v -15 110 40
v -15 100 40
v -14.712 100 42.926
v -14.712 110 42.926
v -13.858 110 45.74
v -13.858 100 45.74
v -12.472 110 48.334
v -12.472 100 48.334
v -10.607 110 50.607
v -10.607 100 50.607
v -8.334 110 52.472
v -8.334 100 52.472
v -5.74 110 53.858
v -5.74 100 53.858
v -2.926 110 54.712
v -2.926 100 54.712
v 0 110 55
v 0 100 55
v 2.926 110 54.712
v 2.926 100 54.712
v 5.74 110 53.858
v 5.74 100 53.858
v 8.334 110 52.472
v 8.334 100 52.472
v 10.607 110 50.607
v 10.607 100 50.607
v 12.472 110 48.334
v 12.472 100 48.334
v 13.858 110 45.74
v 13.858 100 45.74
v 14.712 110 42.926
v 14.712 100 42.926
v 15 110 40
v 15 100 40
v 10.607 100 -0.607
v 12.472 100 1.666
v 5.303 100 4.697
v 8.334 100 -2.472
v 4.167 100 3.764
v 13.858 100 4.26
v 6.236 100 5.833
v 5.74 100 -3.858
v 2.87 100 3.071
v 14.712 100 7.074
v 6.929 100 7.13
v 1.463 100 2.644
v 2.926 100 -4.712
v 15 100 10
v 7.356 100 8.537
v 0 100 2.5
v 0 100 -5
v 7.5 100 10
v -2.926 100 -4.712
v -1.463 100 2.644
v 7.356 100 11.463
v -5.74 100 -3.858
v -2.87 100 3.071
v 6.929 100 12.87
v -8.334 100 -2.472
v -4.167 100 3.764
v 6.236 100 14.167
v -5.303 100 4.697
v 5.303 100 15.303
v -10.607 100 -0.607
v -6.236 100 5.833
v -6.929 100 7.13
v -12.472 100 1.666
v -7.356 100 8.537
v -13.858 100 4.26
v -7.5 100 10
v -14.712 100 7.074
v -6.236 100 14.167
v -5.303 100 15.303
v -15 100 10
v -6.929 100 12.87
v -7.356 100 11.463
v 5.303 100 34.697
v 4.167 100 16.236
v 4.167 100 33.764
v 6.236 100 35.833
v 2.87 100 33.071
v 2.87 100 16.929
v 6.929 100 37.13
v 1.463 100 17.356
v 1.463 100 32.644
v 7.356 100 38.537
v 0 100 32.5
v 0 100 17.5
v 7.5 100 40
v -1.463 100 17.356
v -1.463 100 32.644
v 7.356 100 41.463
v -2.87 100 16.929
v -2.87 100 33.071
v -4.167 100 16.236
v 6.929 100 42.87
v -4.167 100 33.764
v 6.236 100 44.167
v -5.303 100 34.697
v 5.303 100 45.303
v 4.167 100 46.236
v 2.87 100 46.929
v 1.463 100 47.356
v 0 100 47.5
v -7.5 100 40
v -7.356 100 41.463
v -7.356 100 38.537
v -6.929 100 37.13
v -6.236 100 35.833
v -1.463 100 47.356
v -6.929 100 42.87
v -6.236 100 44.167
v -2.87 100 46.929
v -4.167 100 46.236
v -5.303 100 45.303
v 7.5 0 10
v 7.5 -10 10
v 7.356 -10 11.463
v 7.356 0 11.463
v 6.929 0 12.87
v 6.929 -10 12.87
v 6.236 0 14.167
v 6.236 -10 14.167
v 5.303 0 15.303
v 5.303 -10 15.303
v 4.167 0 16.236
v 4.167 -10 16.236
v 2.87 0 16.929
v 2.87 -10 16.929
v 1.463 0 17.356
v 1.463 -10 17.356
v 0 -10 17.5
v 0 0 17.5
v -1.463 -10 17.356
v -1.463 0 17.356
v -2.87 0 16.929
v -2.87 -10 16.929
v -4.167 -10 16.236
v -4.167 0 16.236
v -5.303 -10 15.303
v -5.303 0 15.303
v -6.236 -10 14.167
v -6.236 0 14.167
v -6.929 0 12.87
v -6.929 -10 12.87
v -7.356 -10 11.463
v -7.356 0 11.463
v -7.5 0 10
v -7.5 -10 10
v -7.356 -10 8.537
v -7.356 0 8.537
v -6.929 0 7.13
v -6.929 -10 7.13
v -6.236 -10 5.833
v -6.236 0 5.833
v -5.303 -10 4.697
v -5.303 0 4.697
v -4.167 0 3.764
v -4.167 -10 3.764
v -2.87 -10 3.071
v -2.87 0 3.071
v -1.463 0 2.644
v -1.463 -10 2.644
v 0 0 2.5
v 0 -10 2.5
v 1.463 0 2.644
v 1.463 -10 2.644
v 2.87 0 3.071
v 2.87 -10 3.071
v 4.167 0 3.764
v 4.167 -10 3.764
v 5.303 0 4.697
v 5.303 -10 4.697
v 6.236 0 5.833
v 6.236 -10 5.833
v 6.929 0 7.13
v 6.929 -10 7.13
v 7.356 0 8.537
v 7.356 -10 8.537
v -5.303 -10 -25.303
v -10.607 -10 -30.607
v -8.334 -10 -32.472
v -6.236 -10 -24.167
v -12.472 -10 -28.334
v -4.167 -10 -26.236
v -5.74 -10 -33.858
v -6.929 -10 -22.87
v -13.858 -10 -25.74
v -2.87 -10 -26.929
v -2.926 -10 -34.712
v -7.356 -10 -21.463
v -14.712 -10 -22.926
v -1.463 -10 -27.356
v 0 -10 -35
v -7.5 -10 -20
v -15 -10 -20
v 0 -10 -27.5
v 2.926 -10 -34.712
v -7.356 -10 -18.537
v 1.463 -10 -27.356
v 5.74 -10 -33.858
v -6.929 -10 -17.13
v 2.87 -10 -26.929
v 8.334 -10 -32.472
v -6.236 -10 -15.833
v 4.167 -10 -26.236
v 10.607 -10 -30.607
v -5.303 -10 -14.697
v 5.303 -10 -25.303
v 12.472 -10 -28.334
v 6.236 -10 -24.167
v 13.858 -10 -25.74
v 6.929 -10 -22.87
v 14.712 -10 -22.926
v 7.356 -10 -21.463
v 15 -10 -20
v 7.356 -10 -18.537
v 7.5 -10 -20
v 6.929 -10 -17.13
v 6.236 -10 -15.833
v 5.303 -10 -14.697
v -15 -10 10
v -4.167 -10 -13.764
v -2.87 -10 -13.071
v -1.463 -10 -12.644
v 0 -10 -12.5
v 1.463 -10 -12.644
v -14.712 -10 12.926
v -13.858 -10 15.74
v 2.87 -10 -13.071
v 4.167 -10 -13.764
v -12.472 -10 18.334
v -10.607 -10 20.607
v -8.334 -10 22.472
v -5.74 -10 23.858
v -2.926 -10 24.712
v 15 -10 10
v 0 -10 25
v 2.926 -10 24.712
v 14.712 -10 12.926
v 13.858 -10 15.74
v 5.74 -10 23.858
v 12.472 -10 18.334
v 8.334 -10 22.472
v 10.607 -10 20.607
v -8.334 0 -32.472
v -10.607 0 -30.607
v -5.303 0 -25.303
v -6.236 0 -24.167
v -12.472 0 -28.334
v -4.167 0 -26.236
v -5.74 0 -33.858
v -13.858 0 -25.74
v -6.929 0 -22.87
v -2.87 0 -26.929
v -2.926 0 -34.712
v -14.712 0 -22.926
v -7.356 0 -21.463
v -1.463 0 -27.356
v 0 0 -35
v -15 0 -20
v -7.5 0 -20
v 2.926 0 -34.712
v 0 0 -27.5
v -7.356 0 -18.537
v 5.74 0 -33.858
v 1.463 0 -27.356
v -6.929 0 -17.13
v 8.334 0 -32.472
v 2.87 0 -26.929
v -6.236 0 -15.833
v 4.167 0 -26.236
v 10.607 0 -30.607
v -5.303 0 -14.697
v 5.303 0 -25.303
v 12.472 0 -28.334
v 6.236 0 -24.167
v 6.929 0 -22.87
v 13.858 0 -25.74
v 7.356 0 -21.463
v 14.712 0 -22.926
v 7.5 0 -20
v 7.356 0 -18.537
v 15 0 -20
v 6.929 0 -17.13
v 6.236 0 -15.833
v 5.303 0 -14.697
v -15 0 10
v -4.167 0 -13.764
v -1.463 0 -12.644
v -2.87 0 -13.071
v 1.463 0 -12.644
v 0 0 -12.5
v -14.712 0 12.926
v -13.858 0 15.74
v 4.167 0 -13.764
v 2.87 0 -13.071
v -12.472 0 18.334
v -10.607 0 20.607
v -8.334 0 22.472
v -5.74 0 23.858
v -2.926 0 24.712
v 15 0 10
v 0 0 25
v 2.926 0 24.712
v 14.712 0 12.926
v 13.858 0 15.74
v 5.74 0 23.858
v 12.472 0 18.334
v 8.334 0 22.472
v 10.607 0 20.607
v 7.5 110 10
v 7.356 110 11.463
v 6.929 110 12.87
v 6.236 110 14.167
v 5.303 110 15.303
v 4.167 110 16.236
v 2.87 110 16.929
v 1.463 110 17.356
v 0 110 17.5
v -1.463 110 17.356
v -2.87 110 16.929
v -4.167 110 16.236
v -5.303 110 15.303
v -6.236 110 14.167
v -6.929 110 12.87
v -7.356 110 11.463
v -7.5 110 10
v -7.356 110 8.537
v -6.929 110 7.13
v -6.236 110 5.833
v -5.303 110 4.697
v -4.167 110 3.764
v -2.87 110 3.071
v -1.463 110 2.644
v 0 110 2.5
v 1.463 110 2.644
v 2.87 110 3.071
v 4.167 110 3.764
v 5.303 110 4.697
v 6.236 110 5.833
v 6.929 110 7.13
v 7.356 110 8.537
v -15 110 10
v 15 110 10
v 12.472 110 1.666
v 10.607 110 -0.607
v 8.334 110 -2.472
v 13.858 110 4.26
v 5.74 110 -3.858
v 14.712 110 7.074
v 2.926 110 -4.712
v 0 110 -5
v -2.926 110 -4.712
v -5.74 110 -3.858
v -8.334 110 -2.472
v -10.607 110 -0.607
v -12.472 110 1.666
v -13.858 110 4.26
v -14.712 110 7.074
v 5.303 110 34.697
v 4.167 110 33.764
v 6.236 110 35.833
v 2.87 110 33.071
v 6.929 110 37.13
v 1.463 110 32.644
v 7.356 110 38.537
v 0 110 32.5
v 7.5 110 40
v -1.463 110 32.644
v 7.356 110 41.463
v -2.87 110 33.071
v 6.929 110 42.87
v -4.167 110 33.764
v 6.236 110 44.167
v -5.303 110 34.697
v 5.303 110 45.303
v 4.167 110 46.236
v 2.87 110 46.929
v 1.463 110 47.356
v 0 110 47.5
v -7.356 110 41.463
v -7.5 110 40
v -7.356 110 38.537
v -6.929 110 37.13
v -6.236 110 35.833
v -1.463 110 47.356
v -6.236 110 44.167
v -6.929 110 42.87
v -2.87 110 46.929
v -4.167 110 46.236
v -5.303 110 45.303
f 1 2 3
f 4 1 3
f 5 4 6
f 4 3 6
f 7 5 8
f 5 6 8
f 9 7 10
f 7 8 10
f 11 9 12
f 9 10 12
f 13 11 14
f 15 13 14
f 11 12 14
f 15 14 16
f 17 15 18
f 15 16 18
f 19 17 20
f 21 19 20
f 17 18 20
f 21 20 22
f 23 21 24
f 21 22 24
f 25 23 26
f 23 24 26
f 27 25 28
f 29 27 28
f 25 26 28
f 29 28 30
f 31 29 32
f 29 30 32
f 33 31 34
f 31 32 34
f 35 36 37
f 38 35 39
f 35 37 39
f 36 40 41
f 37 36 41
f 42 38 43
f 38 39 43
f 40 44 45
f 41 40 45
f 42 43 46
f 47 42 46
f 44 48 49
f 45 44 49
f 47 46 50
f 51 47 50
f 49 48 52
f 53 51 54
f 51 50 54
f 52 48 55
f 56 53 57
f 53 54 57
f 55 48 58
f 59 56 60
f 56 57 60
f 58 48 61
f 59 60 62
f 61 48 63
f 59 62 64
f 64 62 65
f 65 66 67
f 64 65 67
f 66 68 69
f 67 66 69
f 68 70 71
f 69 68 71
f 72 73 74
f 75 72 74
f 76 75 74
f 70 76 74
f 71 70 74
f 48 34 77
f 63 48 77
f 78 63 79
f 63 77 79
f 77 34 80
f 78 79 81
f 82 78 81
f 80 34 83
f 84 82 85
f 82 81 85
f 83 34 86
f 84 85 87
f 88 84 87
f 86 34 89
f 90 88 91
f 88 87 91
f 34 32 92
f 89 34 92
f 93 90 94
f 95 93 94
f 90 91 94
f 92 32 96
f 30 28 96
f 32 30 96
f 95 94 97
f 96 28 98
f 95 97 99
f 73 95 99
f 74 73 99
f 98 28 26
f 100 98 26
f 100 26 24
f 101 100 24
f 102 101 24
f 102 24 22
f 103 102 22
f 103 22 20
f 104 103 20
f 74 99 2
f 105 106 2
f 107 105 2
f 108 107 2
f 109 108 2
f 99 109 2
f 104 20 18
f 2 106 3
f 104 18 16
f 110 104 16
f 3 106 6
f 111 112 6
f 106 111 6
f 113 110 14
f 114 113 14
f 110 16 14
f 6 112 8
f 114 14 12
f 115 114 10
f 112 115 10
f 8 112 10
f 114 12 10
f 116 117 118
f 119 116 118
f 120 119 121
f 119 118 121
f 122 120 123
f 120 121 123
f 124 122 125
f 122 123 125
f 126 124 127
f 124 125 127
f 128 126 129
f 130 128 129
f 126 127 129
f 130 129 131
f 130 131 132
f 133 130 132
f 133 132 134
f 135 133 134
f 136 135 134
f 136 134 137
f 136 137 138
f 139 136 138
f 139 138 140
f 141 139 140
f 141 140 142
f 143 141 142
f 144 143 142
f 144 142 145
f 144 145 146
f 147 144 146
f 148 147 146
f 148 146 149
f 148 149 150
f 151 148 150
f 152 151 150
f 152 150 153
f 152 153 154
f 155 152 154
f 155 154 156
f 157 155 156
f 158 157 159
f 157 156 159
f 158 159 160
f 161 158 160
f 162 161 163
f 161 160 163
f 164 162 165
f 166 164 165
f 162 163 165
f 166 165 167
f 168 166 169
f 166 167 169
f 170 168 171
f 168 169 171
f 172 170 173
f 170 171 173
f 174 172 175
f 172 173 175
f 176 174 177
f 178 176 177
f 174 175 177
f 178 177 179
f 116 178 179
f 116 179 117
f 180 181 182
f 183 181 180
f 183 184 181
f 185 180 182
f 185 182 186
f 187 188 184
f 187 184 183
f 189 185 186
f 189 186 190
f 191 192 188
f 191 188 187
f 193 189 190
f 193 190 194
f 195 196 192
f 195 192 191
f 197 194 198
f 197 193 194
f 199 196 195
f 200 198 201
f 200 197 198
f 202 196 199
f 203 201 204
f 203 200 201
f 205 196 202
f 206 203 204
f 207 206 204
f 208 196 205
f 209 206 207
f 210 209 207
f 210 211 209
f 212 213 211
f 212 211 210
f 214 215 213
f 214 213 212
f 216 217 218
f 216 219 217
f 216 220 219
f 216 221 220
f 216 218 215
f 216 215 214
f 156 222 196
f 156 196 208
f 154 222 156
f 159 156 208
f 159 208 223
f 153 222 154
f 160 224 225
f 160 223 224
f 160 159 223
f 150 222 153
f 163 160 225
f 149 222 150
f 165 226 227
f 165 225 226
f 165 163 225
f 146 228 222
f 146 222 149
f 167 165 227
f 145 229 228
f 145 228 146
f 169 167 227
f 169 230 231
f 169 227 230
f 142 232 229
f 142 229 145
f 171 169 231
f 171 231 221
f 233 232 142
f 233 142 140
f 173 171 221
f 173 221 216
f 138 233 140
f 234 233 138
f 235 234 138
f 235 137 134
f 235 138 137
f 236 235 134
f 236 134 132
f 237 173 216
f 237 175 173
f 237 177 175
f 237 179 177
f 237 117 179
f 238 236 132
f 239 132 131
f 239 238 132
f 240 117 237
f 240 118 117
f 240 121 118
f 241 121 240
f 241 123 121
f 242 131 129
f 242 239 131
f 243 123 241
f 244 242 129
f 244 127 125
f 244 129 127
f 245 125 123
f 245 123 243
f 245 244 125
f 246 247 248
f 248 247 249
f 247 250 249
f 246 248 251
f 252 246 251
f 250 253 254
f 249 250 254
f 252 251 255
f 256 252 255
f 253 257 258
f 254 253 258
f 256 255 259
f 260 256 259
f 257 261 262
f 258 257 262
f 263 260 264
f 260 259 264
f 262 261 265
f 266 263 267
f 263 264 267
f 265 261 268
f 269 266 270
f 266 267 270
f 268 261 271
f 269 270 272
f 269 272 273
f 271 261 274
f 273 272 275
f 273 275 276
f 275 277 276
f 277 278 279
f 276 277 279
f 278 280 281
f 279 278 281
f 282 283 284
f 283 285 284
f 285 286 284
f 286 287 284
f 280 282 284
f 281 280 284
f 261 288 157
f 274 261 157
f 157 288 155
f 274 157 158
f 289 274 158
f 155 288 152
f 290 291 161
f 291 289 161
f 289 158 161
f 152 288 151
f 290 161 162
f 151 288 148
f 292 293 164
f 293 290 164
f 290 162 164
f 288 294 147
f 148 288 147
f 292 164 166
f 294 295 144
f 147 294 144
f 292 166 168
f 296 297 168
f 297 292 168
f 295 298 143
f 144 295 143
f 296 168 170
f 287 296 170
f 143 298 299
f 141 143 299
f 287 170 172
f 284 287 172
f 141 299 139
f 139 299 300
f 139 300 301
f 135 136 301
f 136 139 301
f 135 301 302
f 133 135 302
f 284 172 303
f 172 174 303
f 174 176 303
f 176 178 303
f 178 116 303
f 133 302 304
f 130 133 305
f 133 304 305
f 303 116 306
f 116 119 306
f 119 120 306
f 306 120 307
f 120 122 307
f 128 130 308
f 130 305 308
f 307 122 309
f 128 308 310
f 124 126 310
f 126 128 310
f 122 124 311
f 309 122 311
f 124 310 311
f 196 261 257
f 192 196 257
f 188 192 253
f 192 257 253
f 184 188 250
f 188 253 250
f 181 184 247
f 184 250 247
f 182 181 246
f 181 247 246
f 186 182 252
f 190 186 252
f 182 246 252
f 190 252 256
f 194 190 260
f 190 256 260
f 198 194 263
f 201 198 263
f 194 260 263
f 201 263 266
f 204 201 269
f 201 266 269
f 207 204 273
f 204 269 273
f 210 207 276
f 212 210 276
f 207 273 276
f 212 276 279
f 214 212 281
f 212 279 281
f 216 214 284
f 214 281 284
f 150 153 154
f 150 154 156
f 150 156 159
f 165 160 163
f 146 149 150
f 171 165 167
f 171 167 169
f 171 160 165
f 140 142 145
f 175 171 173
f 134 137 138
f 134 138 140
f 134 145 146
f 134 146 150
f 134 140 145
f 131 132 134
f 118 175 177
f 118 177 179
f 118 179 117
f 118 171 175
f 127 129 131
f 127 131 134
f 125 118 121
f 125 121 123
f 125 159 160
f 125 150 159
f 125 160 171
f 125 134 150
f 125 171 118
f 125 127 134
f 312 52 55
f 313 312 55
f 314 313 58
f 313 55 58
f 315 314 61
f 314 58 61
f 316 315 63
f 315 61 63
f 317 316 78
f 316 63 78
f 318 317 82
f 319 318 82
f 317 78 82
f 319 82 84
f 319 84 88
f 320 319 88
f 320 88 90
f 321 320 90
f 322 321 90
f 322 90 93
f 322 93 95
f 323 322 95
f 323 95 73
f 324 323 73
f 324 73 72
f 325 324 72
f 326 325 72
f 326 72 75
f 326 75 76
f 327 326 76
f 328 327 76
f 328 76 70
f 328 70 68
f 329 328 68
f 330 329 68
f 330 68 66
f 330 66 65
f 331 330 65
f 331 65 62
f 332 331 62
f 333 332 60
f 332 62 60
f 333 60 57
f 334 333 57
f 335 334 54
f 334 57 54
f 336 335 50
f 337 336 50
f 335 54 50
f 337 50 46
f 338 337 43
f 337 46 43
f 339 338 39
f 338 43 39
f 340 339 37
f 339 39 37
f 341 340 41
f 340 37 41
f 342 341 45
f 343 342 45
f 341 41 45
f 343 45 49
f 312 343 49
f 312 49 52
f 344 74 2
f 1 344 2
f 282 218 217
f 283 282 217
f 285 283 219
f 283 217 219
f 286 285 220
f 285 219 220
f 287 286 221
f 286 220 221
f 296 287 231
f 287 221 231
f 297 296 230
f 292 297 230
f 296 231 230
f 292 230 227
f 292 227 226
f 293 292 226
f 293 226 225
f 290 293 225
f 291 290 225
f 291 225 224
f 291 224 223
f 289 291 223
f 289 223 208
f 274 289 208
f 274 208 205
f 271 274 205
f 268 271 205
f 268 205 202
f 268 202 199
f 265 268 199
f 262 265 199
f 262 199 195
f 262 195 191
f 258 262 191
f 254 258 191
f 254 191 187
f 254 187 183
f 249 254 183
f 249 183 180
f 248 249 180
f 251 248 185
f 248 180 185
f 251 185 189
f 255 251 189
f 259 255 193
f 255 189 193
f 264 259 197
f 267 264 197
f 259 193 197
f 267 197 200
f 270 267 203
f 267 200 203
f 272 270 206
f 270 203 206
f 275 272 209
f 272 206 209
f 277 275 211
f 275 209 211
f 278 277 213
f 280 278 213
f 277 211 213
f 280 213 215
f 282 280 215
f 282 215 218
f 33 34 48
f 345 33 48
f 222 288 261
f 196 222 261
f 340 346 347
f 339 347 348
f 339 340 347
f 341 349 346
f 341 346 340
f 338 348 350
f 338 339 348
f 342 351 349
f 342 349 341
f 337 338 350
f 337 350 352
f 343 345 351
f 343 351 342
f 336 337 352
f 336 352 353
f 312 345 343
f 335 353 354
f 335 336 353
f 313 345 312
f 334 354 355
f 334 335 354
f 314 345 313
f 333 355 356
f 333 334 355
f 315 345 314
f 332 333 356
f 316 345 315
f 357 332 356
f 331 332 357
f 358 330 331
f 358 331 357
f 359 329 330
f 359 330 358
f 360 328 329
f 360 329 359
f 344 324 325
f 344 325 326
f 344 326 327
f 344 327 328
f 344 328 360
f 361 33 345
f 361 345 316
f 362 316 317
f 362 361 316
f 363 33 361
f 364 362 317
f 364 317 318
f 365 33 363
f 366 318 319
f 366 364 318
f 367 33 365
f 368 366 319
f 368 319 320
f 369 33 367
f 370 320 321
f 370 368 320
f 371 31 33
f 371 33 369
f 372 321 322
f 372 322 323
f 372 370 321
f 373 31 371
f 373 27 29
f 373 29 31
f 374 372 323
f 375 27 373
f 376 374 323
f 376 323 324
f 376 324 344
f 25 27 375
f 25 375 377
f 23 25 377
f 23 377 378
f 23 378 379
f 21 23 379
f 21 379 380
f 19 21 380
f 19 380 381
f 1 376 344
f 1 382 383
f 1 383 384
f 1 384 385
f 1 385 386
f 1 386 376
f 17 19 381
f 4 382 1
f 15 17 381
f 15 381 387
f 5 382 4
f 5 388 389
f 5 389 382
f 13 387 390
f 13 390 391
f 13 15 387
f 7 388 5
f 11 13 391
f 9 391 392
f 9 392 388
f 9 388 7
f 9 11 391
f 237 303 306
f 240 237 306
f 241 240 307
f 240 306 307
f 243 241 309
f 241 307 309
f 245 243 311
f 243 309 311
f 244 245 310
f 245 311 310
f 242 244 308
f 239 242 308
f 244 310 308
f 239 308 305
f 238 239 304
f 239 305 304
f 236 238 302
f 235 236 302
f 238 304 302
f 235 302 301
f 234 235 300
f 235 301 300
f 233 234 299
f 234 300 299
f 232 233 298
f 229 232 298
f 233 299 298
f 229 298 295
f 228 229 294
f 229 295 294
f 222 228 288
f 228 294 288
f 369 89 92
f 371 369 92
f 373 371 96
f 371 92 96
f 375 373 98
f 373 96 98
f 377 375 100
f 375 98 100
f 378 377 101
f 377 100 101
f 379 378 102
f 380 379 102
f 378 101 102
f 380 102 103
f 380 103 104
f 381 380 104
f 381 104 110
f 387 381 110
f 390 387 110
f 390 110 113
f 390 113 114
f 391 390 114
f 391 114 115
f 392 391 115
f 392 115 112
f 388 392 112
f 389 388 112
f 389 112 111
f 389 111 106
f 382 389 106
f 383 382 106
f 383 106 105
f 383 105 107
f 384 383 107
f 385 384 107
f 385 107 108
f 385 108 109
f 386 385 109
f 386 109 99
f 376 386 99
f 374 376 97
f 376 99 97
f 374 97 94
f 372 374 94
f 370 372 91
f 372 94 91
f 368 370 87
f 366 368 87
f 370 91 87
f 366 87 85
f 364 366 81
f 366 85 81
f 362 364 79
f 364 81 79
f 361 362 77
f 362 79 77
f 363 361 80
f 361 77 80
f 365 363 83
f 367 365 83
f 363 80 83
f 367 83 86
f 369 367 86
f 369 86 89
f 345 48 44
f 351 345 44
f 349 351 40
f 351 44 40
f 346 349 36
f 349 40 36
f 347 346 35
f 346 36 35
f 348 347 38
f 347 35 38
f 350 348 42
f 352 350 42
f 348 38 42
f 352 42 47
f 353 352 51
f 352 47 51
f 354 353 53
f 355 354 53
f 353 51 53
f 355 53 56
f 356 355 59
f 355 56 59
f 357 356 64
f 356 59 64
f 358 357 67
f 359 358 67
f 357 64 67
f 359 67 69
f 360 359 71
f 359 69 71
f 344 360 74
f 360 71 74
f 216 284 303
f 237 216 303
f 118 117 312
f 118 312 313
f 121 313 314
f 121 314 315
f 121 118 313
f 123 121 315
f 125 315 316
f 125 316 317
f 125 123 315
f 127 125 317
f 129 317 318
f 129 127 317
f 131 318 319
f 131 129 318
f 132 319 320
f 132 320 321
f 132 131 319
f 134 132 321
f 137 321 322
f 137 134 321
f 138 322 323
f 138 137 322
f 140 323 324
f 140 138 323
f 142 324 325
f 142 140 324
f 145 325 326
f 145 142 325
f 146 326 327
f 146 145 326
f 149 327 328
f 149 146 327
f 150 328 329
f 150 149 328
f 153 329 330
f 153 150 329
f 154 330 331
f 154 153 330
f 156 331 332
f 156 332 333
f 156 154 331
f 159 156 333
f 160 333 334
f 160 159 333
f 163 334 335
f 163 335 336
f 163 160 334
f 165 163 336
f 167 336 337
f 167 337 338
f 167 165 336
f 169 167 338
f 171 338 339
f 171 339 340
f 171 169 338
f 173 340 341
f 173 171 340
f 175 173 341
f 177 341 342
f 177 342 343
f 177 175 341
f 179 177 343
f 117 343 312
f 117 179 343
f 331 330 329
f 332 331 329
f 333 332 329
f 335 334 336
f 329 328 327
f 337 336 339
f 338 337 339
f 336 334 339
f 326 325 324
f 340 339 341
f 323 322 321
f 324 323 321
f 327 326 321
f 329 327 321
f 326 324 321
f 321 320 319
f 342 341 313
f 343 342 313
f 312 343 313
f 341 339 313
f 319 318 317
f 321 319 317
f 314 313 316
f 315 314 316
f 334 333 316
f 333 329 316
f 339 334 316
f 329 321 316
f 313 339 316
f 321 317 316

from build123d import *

# Parameters (mm, degrees)
F1_DEPTH  = 10
F2_R      = 7.5
F3_DEPTH  = 25
F6_DEPTH  = 10
F7_R      = 7.5
F8_DEPTH  = 25
F9_R      = 7.5
F10_DEPTH = 120


with BuildPart() as f1:
    # F0 (on Front) → F1 (new body)
    with BuildSketch(Plane.XZ):
        with BuildLine():
            Line((15, -20), (15, 10))
            ThreePointArc((15, 10), (0, 25), (-15, 10))
            Line((-15, 10), (-15, -20))
            ThreePointArc((-15, -20), (0, -35), (15, -20))
        make_face()
    extrude(amount=F1_DEPTH)

    # F2 (on face) → F3 (cut)
    with BuildSketch(Plane.XZ.offset(10)):
        with Locations((0, 10)):
            Circle(F2_R)
        with Locations((0, -20)):
            Circle(F2_R)
    extrude(amount=-F3_DEPTH, mode=Mode.SUBTRACT)


with BuildPart() as f6:
    # F5 (on offset) → F6 (new body)
    with BuildSketch(Plane(origin=(0, 100, 0), x_dir=(-1, 0, 0), z_dir=(0, 1, 0))):
        with BuildLine():
            Line((-15, 40), (-15, 10))
            ThreePointArc((-15, 10), (0, -5), (15, 10))
            Line((15, 10), (15, 40))
            ThreePointArc((15, 40), (0, 55), (-15, 40))
        make_face()
    extrude(amount=F6_DEPTH)

    # F7 (on face) → F8 (cut)
    with BuildSketch(Plane.XZ.offset(-100)):
        with Locations((0, 10)):
            Circle(F7_R)
        with Locations((0, 40)):
            Circle(F7_R)
    extrude(amount=-F8_DEPTH, mode=Mode.SUBTRACT)


with BuildPart() as f10:
    # F9 (on face) → F10 (new body)
    with BuildSketch(Plane.XZ.offset(10)):
        with Locations((0, 10)):
            Circle(F9_R)
    extrude(amount=-F10_DEPTH)


solid = Compound([f1.part, f6.part, f10.part])
